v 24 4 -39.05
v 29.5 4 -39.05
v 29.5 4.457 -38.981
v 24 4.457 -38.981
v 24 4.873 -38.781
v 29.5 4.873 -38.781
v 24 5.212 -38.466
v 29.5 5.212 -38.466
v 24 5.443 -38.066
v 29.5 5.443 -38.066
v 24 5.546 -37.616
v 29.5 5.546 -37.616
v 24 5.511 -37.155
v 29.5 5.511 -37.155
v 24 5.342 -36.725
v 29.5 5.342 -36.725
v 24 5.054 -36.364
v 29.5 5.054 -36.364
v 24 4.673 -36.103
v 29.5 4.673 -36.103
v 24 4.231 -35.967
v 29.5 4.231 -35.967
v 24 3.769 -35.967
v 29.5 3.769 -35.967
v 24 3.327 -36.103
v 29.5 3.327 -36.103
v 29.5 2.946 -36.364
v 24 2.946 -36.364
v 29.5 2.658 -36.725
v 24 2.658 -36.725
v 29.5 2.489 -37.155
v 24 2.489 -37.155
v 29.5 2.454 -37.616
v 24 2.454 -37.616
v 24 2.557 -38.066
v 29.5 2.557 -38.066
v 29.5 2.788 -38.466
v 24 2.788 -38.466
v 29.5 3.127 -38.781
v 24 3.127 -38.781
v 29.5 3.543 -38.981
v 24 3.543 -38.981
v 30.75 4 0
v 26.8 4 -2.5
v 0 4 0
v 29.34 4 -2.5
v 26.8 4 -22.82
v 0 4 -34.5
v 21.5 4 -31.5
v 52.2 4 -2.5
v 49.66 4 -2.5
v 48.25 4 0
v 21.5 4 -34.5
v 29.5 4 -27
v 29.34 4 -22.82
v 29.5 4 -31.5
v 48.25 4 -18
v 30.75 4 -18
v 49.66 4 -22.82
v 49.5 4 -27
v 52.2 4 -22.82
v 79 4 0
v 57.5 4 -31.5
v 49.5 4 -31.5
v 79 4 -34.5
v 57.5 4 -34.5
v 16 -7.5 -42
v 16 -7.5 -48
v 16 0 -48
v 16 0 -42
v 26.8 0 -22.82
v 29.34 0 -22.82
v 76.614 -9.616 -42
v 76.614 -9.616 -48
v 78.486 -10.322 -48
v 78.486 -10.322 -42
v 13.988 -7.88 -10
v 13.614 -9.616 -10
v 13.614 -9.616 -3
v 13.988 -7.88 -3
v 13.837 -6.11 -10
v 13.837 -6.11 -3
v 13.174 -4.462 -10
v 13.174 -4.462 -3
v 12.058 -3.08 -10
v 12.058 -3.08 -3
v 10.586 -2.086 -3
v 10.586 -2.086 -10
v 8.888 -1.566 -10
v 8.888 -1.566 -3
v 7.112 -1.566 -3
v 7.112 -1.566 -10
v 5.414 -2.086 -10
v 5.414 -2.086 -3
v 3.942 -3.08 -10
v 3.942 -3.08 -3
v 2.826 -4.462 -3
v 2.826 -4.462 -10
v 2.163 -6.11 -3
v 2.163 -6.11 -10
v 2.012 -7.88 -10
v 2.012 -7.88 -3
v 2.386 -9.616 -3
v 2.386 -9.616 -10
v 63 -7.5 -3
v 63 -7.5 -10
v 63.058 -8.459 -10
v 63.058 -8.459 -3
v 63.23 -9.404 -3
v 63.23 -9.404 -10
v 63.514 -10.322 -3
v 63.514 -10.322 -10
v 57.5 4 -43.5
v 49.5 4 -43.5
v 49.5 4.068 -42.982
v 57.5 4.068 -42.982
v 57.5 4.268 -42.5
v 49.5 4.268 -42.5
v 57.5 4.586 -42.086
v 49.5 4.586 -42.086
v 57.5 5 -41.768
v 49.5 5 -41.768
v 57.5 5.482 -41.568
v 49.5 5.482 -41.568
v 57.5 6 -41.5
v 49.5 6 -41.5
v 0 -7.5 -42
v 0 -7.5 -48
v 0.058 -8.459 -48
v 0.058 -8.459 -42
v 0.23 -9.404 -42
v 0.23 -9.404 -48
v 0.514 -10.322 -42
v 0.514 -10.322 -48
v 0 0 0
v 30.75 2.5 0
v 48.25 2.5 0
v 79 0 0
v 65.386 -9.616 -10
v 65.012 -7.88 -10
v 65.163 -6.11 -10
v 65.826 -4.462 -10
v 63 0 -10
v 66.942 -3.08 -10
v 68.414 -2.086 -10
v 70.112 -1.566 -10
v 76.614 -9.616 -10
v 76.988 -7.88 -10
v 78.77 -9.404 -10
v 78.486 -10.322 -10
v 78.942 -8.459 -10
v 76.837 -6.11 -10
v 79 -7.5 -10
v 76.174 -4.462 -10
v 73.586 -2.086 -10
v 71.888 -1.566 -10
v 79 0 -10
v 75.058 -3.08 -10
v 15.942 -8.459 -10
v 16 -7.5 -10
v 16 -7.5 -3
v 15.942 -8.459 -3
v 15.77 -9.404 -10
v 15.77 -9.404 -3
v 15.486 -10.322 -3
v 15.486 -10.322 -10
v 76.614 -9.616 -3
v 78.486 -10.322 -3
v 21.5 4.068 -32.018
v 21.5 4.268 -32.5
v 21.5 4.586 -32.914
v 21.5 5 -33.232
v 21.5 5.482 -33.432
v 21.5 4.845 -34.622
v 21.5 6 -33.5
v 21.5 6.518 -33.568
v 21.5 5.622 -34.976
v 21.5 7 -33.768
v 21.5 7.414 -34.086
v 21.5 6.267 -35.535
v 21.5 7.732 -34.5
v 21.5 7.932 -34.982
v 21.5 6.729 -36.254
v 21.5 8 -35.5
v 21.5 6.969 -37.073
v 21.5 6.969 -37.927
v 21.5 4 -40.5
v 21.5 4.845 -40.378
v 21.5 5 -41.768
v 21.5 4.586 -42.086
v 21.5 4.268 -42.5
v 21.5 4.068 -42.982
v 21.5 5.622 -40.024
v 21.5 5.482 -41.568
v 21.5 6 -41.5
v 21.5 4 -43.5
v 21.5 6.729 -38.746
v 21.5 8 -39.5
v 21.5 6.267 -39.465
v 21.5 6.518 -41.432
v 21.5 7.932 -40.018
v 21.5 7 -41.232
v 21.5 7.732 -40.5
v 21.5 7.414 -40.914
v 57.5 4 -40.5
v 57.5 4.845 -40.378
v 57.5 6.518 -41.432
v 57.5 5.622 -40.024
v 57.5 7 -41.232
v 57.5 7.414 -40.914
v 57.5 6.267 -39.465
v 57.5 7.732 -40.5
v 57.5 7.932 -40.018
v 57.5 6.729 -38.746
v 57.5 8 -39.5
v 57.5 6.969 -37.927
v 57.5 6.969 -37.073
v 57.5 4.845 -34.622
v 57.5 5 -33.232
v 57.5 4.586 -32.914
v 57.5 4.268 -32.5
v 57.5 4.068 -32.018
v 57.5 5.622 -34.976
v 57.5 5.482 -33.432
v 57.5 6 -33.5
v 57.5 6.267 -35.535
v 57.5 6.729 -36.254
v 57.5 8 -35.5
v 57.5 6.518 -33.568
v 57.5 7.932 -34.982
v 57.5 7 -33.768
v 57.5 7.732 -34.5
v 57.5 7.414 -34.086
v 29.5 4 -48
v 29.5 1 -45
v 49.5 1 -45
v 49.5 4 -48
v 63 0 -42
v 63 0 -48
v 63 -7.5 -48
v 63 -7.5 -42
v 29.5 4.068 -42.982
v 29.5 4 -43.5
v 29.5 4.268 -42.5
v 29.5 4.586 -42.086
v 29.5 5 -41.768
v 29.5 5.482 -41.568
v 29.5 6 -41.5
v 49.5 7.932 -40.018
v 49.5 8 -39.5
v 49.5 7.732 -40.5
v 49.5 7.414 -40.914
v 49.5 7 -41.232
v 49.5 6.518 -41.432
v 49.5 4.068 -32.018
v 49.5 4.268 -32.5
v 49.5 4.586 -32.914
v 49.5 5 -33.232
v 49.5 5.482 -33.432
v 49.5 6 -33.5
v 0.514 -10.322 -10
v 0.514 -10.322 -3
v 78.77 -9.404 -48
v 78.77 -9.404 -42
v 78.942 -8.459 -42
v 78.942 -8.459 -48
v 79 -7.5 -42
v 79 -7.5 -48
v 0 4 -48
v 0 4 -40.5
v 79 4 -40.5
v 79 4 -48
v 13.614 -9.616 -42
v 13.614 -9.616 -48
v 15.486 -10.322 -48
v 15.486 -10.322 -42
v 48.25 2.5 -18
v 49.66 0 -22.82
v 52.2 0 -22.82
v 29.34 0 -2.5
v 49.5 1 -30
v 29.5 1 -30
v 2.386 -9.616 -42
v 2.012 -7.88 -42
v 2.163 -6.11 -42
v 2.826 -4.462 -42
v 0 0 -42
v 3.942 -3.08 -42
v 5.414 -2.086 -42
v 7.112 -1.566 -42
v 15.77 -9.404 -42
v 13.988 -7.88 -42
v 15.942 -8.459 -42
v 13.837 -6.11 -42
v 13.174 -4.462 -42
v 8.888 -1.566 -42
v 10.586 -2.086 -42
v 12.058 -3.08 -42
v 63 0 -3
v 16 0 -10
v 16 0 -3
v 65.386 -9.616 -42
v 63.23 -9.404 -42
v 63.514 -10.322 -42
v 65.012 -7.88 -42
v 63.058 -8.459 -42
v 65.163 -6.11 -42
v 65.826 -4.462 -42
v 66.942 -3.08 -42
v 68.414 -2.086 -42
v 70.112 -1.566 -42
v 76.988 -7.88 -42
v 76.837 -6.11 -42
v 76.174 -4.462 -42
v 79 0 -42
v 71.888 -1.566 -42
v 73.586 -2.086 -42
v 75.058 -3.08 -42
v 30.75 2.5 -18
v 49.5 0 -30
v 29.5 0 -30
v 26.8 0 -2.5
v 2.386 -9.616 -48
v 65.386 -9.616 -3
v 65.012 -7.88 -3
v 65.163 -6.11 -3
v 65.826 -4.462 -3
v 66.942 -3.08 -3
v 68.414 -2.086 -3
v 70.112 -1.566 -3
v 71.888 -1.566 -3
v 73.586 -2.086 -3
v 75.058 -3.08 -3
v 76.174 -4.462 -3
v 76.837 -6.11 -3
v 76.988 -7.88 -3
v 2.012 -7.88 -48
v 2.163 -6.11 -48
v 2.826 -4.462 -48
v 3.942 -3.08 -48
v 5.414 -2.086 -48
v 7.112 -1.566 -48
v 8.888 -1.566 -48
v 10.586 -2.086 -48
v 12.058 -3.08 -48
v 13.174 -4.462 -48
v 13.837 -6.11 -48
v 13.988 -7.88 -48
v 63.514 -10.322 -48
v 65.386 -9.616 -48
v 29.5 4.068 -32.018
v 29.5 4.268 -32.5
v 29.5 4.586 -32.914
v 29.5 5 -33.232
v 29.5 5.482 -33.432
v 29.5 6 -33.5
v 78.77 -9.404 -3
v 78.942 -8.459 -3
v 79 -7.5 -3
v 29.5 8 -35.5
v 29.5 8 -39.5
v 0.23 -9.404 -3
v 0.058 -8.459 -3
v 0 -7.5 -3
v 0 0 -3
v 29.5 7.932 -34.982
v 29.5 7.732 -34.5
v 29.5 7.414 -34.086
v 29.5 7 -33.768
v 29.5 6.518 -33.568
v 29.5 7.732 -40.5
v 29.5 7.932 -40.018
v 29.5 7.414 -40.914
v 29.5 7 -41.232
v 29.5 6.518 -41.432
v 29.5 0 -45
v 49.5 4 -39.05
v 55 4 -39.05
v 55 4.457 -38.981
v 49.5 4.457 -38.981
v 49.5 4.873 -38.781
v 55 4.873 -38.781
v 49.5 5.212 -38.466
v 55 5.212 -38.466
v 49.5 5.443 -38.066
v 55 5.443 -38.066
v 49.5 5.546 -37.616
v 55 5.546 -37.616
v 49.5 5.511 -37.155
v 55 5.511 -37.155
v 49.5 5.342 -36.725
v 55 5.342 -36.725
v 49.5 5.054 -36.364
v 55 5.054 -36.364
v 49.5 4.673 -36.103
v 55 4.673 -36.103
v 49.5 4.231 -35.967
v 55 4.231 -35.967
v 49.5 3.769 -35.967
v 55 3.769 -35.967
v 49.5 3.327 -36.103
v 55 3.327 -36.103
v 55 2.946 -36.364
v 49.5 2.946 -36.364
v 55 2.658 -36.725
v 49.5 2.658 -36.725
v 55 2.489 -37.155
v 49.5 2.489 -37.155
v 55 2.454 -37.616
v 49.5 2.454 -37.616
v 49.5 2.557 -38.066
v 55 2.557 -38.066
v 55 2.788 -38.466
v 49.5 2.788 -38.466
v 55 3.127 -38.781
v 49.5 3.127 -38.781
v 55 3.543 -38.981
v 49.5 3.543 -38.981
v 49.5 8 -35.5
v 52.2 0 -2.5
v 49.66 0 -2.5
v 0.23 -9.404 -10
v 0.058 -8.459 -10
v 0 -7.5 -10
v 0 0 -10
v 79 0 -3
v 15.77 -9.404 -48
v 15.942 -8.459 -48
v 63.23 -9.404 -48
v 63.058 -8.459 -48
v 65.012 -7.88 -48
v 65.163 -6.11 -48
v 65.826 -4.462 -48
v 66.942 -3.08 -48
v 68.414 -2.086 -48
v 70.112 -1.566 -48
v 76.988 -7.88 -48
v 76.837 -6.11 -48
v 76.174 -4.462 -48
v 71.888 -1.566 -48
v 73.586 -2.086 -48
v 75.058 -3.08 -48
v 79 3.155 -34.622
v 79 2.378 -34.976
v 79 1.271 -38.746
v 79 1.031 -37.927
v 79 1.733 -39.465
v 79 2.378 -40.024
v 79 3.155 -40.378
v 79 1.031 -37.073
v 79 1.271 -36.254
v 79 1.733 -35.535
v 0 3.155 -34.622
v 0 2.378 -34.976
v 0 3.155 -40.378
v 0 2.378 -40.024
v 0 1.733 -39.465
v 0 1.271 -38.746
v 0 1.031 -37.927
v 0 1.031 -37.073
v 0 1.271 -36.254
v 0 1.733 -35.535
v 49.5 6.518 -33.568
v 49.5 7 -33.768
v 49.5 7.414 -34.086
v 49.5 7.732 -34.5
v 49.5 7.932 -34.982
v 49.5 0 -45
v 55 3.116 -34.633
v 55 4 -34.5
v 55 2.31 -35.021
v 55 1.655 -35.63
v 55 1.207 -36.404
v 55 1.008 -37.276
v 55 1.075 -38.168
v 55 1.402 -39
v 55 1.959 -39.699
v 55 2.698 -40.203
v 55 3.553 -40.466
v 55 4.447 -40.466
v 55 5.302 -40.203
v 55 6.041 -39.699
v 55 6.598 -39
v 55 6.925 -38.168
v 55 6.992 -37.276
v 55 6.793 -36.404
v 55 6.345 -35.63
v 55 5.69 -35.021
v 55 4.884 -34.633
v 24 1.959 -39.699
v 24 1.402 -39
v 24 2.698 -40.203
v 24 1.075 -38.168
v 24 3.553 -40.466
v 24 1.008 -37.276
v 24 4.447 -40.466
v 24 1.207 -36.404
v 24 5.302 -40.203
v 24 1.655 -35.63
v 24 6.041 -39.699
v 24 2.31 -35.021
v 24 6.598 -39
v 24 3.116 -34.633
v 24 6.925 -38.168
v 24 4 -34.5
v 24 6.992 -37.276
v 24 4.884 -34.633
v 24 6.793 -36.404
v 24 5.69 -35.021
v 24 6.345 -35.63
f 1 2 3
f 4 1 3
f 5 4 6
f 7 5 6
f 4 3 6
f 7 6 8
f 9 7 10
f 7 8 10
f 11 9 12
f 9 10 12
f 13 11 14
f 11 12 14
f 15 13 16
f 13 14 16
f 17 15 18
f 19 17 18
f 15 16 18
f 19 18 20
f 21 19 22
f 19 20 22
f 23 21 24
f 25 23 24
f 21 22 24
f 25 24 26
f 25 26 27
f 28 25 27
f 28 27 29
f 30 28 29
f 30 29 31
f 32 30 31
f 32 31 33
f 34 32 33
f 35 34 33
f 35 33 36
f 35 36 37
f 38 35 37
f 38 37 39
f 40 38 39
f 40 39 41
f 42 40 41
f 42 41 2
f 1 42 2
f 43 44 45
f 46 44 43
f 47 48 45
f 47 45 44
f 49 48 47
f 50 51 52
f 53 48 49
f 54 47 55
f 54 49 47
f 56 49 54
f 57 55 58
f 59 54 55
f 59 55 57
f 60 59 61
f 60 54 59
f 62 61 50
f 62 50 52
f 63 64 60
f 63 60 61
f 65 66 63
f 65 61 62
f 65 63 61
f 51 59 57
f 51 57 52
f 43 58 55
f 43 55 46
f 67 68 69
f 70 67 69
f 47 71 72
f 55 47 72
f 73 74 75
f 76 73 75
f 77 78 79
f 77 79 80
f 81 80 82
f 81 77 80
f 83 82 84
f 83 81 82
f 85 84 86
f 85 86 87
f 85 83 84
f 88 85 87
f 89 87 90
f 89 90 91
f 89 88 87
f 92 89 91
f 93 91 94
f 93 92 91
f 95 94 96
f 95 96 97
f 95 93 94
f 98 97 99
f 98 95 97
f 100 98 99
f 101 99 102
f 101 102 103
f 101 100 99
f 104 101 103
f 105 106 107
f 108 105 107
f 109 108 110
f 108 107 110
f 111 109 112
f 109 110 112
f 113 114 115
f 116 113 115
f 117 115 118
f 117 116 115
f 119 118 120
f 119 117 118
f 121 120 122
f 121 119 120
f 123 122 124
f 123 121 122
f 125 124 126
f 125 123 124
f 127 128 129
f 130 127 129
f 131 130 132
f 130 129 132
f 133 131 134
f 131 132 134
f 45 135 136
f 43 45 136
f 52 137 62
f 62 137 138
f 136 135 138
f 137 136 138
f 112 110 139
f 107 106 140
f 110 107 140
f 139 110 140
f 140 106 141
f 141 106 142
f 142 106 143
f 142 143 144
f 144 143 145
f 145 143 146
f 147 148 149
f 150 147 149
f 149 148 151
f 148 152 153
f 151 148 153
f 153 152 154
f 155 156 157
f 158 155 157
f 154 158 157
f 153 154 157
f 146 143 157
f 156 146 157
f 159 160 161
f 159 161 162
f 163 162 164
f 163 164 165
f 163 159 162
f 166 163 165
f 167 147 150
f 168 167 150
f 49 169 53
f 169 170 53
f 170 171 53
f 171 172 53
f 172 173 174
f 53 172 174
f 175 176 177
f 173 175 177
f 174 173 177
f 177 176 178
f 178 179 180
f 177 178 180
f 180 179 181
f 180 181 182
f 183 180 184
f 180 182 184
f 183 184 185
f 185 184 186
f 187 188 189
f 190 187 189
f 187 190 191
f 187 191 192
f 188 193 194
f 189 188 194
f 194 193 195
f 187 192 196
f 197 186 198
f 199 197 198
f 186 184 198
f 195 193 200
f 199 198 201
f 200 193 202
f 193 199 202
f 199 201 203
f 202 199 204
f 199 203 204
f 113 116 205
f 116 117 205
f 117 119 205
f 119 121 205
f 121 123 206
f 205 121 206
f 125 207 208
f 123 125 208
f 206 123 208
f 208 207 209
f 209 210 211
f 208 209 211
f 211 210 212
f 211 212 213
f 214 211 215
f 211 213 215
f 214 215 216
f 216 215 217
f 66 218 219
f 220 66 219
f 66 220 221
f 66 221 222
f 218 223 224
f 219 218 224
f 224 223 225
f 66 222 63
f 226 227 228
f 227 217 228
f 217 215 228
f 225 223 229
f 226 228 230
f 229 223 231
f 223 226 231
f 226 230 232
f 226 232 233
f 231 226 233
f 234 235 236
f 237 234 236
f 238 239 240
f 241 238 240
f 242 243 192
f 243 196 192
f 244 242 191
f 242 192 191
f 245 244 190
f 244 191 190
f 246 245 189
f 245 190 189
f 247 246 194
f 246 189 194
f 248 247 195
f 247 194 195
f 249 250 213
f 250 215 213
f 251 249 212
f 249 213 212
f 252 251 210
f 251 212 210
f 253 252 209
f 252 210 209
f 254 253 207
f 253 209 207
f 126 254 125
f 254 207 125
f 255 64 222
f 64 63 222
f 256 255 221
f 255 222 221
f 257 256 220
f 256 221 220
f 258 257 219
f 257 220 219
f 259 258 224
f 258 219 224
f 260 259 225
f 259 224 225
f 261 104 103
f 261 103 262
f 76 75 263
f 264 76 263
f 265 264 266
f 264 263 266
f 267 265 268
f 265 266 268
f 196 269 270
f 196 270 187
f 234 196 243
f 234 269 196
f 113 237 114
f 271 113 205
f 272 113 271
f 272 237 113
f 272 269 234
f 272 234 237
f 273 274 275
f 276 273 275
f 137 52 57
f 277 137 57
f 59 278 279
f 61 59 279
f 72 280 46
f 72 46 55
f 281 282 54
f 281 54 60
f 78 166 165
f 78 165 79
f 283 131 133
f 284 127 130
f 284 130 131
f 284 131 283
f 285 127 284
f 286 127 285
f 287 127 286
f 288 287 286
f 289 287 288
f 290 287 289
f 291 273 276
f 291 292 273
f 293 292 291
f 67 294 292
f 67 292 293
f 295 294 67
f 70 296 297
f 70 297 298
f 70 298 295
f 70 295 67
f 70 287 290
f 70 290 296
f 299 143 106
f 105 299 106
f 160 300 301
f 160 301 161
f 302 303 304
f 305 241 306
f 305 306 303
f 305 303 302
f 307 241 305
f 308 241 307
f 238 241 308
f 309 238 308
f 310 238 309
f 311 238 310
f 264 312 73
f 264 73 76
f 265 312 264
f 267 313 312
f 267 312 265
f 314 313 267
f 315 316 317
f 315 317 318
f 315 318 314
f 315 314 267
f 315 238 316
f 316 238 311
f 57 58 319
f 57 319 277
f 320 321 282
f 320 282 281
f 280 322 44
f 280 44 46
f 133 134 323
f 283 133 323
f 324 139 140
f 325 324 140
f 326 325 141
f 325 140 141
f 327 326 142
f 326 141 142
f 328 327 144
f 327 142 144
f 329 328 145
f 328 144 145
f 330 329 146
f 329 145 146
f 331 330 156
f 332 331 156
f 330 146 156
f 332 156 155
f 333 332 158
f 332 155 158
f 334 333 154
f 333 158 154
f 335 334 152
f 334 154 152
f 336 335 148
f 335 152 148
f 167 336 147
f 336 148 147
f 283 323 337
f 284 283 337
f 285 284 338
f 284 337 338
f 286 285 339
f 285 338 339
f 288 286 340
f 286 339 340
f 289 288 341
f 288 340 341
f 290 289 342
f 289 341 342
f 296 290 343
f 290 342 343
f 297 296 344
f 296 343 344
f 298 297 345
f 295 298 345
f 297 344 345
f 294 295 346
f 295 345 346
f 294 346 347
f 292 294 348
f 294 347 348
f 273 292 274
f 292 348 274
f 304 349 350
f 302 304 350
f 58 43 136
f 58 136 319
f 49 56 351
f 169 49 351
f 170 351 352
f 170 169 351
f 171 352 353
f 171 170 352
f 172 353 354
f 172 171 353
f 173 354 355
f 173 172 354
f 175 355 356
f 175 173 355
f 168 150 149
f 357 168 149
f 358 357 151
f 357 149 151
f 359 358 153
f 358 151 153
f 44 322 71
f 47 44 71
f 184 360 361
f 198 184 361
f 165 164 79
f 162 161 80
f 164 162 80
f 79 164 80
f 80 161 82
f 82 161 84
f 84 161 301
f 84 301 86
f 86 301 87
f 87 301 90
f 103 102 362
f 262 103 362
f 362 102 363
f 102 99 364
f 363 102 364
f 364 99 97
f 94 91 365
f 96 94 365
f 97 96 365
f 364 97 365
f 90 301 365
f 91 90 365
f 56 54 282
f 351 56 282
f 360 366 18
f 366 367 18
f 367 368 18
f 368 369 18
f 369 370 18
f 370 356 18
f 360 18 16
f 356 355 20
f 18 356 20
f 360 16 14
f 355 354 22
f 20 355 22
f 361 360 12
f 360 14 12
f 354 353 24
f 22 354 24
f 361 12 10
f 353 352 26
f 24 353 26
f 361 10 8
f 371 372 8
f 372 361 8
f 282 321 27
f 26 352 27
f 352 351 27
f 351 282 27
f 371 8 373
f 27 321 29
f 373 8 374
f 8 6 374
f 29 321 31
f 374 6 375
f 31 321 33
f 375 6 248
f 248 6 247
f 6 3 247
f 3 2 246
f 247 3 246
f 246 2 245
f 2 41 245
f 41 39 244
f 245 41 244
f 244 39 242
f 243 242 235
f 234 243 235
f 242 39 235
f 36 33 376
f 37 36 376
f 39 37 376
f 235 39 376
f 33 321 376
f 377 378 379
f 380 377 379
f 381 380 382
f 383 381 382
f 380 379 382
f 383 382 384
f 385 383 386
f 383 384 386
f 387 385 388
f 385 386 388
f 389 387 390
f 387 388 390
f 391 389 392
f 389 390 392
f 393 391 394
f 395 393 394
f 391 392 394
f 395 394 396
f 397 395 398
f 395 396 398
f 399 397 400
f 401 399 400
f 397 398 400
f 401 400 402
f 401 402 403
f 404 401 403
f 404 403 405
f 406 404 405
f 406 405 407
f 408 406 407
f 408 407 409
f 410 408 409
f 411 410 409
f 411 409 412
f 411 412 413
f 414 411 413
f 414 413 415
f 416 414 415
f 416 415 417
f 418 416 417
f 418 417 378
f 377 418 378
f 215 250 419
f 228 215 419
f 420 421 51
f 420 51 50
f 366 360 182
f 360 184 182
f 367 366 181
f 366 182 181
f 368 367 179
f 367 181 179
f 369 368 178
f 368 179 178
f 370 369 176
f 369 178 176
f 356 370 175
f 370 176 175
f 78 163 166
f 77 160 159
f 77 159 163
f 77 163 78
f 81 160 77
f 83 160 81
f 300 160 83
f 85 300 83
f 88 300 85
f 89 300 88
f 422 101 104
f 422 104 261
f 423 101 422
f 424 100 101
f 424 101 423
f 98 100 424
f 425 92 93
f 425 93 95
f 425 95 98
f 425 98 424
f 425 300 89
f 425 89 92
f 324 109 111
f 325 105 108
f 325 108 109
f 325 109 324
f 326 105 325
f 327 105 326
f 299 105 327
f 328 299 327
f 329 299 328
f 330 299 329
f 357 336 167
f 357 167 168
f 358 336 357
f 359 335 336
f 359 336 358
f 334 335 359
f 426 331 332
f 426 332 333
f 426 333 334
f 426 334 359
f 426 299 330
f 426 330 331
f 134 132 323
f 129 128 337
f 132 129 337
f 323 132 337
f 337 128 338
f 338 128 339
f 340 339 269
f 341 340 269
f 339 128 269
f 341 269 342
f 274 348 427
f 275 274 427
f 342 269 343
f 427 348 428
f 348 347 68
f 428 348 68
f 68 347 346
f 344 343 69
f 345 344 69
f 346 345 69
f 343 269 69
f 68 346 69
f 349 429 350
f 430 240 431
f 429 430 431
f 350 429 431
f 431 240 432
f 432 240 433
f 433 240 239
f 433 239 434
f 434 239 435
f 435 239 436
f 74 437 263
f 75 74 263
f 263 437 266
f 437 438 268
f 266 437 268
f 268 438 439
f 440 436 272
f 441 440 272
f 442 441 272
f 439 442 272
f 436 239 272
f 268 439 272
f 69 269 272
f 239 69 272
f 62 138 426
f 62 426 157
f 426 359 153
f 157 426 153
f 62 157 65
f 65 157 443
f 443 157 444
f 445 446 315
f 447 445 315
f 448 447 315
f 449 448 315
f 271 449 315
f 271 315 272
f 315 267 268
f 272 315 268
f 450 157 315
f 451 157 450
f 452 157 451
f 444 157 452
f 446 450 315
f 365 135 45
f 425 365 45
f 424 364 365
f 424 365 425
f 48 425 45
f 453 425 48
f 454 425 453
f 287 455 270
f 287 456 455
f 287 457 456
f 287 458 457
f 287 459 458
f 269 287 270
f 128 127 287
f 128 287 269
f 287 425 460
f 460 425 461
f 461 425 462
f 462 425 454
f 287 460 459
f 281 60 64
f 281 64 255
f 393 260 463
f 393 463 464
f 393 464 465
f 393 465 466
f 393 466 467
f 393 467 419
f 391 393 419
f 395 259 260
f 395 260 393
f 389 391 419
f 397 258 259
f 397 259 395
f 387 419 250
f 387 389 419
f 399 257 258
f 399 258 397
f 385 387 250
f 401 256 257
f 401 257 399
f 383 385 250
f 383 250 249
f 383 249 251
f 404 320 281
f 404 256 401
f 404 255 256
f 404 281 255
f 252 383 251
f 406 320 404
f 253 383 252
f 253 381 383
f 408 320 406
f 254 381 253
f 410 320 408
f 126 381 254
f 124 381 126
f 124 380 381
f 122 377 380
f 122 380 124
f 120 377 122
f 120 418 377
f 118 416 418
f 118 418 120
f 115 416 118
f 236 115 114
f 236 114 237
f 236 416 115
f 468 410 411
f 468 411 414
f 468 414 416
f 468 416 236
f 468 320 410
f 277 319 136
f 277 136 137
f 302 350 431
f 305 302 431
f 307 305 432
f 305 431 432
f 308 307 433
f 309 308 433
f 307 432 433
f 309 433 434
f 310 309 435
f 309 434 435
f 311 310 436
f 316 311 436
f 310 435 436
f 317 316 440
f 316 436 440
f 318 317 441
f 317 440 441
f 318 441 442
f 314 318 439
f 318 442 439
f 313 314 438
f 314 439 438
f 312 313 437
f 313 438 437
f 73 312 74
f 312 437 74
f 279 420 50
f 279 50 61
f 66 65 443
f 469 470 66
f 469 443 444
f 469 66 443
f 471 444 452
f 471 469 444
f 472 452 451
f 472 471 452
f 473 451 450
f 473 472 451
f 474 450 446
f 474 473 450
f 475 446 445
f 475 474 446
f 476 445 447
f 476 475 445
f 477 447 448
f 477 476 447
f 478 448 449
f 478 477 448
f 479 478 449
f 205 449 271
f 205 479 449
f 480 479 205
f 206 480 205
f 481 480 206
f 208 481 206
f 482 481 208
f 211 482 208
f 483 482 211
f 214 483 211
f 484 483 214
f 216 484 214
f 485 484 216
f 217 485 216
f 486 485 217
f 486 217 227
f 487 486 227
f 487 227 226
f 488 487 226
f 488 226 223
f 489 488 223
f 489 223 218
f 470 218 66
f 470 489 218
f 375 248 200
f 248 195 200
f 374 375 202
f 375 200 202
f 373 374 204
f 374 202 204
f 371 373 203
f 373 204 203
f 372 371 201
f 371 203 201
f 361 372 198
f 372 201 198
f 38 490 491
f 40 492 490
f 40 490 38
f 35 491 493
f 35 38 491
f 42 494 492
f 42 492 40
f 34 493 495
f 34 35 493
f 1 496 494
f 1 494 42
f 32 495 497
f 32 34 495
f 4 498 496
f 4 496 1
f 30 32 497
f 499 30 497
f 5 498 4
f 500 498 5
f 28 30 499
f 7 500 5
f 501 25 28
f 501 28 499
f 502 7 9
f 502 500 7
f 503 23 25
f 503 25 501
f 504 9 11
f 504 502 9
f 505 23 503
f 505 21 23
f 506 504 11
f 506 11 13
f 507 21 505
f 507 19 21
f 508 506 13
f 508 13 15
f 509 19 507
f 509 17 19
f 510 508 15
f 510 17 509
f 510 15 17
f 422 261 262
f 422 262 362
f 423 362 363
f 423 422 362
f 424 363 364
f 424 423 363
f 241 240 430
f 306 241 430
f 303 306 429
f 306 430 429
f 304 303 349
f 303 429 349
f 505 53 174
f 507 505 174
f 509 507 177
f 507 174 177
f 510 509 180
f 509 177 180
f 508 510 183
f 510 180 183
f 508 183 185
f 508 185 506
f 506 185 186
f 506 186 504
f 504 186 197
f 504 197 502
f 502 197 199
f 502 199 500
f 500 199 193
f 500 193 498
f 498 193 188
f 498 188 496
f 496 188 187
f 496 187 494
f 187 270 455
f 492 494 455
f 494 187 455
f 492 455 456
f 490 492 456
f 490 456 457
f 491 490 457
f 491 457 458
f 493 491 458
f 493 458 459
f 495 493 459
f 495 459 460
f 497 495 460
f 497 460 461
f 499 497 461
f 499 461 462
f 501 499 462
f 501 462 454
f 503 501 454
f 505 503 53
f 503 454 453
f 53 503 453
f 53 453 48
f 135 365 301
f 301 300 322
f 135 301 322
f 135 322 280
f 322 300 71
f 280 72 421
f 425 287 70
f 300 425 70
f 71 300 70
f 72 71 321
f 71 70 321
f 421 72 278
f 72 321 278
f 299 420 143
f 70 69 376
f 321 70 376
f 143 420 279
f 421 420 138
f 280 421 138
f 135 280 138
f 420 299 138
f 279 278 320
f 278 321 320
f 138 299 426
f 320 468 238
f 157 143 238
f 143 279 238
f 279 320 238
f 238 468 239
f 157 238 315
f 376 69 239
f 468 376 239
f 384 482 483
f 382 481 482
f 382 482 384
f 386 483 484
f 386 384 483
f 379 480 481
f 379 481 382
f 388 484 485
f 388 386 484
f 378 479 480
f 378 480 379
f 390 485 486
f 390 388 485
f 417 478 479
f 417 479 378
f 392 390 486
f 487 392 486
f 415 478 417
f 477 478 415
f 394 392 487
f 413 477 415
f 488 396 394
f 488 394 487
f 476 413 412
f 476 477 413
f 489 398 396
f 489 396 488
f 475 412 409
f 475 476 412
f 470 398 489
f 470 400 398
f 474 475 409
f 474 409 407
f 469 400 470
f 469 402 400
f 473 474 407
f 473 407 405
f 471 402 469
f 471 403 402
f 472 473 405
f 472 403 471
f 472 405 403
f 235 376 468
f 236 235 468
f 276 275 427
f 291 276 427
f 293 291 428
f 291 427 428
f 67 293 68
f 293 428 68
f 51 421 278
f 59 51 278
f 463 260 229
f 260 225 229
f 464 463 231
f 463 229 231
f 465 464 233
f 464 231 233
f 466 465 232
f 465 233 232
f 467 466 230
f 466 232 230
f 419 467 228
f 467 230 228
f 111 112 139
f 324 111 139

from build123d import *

# Parameters (mm, degrees)
SKETCH_1_W          = 79
SKETCH_1_H          = 48
SKETCH_1_W_2        = 2.54
SKETCH_1_H_2        = 20.32
SKETCH_1_W_3        = 20
SKETCH_1_H_3        = 15
EXTRUDE_1_DEPTH     = 4
SKETCH_3_W          = 8
SKETCH_3_H          = 4
EXTRUDE_2_DEPTH     = 8
FILLET_1_R          = 2
SKETCH_5_R          = 3
CUT_EXTRUDE_1_DEPTH = 24
SKETCH2_W           = 8
SKETCH2_H           = 4
BOSS_EXTRUDE1_DEPTH = 8
FILLET1_R           = 2
CUT_EXTRUDE2_START  = -24
SKETCH3_R           = 3
CUT_EXTRUDE2_DEPTH  = 24
CHAMFER1_SIZE       = 3
CUT_EXTRUDE5_REACH  = 75.437
SKETCH8_R           = 1.55
BOSS_EXTRUDE4_DEPTH = 6
SKETCH10_W          = 17.5
SKETCH10_H          = 18
CUT_EXTRUDE6_DEPTH  = 1.5
BOSS_EXTRUDE5_DEPTH = 7


with BuildPart() as part:
    # Эскиз1 → Бобышка-Вытянуть1 (new body)
    with BuildSketch(Plane(origin=(0, 0, 0), x_dir=(1, 0, 0), z_dir=(0, 1, 0))):
        with Locations((39.5, 24)):
            Rectangle(SKETCH_1_W, SKETCH_1_H)
        with Locations((28.07, 12.66)):
            Rectangle(SKETCH_1_W_2, SKETCH_1_H_2, mode=Mode.SUBTRACT)
        with Locations((50.93, 12.66)):
            Rectangle(SKETCH_1_W_2, SKETCH_1_H_2, mode=Mode.SUBTRACT)
        with Locations((39.5, 37.5)):
            Rectangle(SKETCH_1_W_3, SKETCH_1_H_3, mode=Mode.SUBTRACT)
    extrude(amount=EXTRUDE_1_DEPTH)

    # Эскиз3 → Бобышка-Вытянуть2 (add)
    with BuildSketch(Plane(origin=(29.5, 0, 0), x_dir=(0, 0, -1), z_dir=(1, 0, 0))):
        with Locations((37.5, 6)):
            Rectangle(SKETCH_3_W, SKETCH_3_H)
    extrude(amount=-EXTRUDE_2_DEPTH)

    # Скругление1
    fillet_1_edges = [part.edges().sort_by_distance(p)[0] for p in [
        (25.5, 4, -41.5),
        (25.5, 4, -33.5),
    ]]
    fillet(fillet_1_edges, radius=FILLET_1_R)
    fillet_1_2_edges = [part.edges().sort_by_distance(p)[0] for p in [
        (25.5, 8, -41.5),
        (25.5, 8, -33.5),
    ]]
    fillet(fillet_1_2_edges, radius=FILLET_1_R - 0.0001)  # a hair under: the kernel refuses the full size

    # Эскиз5 → Вырез-Вытянуть1 (cut)
    with BuildSketch(Plane.ZY):
        with Locations((-37.5, 4)):
            Circle(SKETCH_5_R)
    extrude(amount=-CUT_EXTRUDE_1_DEPTH, mode=Mode.SUBTRACT)

    # Sketch2 → Boss-Extrude1 (add)
    with BuildSketch(Plane.ZY.offset(-49.5)):
        with Locations((-37.5, 6)):
            Rectangle(SKETCH2_W, SKETCH2_H)
    extrude(amount=-BOSS_EXTRUDE1_DEPTH)

    # Fillet1
    fillet1_edges = [part.edges().sort_by_distance(p)[0] for p in [
        (53.5, 4, -33.5),
    ]]
    fillet(fillet1_edges, radius=FILLET1_R)
    fillet1_2_edges = [part.edges().sort_by_distance(p)[0] for p in [
        (53.5, 4, -41.5),
    ]]
    fillet(fillet1_2_edges, radius=FILLET1_R)
    fillet1_3_edges = [part.edges().sort_by_distance(p)[0] for p in [
        (53.5, 8, -33.5),
    ]]
    fillet(fillet1_3_edges, radius=FILLET1_R - 0.0001)  # a hair under: the kernel refuses the full size
    fillet1_4_edges = [part.edges().sort_by_distance(p)[0] for p in [
        (53.5, 8, -41.5),
    ]]
    fillet(fillet1_4_edges, radius=FILLET1_R - 0.0001)  # a hair under: the kernel refuses the full size

    # Sketch3 → Cut-Extrude2 (cut)
    with BuildSketch(Plane(origin=(79, 0, 0), x_dir=(0, 0, -1), z_dir=(1, 0, 0)).offset(CUT_EXTRUDE2_START)):
        with Locations(Location((37.5, 4, 0), (0, 0, 180))):
            Circle(SKETCH3_R)
    extrude(amount=CUT_EXTRUDE2_DEPTH, mode=Mode.SUBTRACT)

    # Chamfer1
    chamfer1_edges = [part.edges().sort_by_distance(p)[0] for p in [
        (39.5, 4, -30),
        (39.5, 4, -45),
    ]]
    chamfer(chamfer1_edges, length=CHAMFER1_SIZE - 0.0001)  # a hair under: the kernel refuses the full size

    # Cut-Extrude5: up to this face of the body (flat: up to its plane)
    cut_extrude5_end = Plane(part.part.faces().sort_by_distance((24, 4, -37.5))[0])
    # Sketch8 → Cut-Extrude5 (cut, up to the picked face)
    with BuildSketch(Plane(origin=(55, 0, 0), x_dir=(0, 0, -1), z_dir=(1, 0, 0)), mode=Mode.PRIVATE) as cut_extrude5_sk1:
        with Locations((37.5, 4)):
            Circle(SKETCH8_R)
    cut_extrude5_tool1 = split(extrude(cut_extrude5_sk1.sketch, amount=-CUT_EXTRUDE5_REACH, mode=Mode.PRIVATE), bisect_by=cut_extrude5_end, keep=Keep.BOTH, mode=Mode.PRIVATE)
    add(cut_extrude5_tool1.solids().sort_by(Axis((55, 4, -37.5), (-1, 0, 0)))[0], mode=Mode.SUBTRACT)

    # Sketch9 → Boss-Extrude4 (add)
    with BuildSketch(Plane(origin=(0, 0, -48), x_dir=(-1, 0, 0), z_dir=(0, 0, -1))):
        with BuildLine():
            Line((-79, 0), (-63, 0))
            Line((-63, 0), (-63, -7.5))
            ThreePointArc((-63, -7.5), (-63.129574487, -8.934016124), (-63.514100561, -10.321579273))
            Line((-63.514100561, -10.321579273), (-65.385575421, -9.616184455))
            ThreePointArc((-65.385575421, -9.616184455), (-71, -1.5), (-76.614424579, -9.616184455))
            Line((-76.614424579, -9.616184455), (-78.485899439, -10.321579273))
            ThreePointArc((-78.485899439, -10.321579273), (-78.870425513, -8.934016124), (-79, -7.5))
            Line((-79, -7.5), (-79, 0))
        make_face()
        with BuildLine():
            Line((-13.614424579, -9.616184455), (-15.485899439, -10.321579273))
            ThreePointArc((-15.485899439, -10.321579273), (-15.870425513, -8.934016124), (-16, -7.5))
            Line((-16, -7.5), (-16, 0))
            Line((-16, 0), (0, 0))
            Line((0, 0), (0, -7.5))
            ThreePointArc((0, -7.5), (-0.129574487, -8.934016124), (-0.514100561, -10.321579273))
            Line((-0.514100561, -10.321579273), (-2.385575421, -9.616184455))
            ThreePointArc((-2.385575421, -9.616184455), (-8, -1.5), (-13.614424579, -9.616184455))
        make_face()
    extrude(amount=-BOSS_EXTRUDE4_DEPTH)

    # Sketch10 → Cut-Extrude6 (cut)
    with BuildSketch(Plane(origin=(0, 4, 0), x_dir=(1, 0, 0), z_dir=(0, 1, 0))):
        with Locations((39.5, 9)):
            Rectangle(SKETCH10_W, SKETCH10_H)
    extrude(amount=-CUT_EXTRUDE6_DEPTH, mode=Mode.SUBTRACT)

    # Sketch13 → Boss-Extrude5 (add)
    with BuildSketch(Plane.XY.offset(-10)):
        with BuildLine():
            Line((0, 0), (16, 0))
            Line((16, 0), (16, -7.5))
            ThreePointArc((16, -7.5), (15.870425513, -8.934016124), (15.485899439, -10.321579273))
            Line((15.485899439, -10.321579273), (13.614424579, -9.616184455))
            ThreePointArc((13.614424579, -9.616184455), (8, -1.5), (2.385575421, -9.616184455))
            Line((2.385575421, -9.616184455), (0.514100561, -10.321579273))
            ThreePointArc((0.514100561, -10.321579273), (0.129574487, -8.934016124), (0, -7.5))
            Line((0, -7.5), (0, 0))
        make_face()
        with BuildLine():
            Line((63, 0), (63, -7.5))
            ThreePointArc((63, -7.5), (63.129574487, -8.934016124), (63.514100561, -10.321579273))
            Line((63.514100561, -10.321579273), (65.385575421, -9.616184455))
            ThreePointArc((65.385575421, -9.616184455), (71, -1.5), (76.614424579, -9.616184455))
            Line((76.614424579, -9.616184455), (78.485899439, -10.321579273))
            ThreePointArc((78.485899439, -10.321579273), (78.870425513, -8.934016124), (79, -7.5))
            Line((79, -7.5), (79, 0))
            Line((79, 0), (63, 0))
        make_face()
    extrude(amount=BOSS_EXTRUDE5_DEPTH)


solid = part.part
